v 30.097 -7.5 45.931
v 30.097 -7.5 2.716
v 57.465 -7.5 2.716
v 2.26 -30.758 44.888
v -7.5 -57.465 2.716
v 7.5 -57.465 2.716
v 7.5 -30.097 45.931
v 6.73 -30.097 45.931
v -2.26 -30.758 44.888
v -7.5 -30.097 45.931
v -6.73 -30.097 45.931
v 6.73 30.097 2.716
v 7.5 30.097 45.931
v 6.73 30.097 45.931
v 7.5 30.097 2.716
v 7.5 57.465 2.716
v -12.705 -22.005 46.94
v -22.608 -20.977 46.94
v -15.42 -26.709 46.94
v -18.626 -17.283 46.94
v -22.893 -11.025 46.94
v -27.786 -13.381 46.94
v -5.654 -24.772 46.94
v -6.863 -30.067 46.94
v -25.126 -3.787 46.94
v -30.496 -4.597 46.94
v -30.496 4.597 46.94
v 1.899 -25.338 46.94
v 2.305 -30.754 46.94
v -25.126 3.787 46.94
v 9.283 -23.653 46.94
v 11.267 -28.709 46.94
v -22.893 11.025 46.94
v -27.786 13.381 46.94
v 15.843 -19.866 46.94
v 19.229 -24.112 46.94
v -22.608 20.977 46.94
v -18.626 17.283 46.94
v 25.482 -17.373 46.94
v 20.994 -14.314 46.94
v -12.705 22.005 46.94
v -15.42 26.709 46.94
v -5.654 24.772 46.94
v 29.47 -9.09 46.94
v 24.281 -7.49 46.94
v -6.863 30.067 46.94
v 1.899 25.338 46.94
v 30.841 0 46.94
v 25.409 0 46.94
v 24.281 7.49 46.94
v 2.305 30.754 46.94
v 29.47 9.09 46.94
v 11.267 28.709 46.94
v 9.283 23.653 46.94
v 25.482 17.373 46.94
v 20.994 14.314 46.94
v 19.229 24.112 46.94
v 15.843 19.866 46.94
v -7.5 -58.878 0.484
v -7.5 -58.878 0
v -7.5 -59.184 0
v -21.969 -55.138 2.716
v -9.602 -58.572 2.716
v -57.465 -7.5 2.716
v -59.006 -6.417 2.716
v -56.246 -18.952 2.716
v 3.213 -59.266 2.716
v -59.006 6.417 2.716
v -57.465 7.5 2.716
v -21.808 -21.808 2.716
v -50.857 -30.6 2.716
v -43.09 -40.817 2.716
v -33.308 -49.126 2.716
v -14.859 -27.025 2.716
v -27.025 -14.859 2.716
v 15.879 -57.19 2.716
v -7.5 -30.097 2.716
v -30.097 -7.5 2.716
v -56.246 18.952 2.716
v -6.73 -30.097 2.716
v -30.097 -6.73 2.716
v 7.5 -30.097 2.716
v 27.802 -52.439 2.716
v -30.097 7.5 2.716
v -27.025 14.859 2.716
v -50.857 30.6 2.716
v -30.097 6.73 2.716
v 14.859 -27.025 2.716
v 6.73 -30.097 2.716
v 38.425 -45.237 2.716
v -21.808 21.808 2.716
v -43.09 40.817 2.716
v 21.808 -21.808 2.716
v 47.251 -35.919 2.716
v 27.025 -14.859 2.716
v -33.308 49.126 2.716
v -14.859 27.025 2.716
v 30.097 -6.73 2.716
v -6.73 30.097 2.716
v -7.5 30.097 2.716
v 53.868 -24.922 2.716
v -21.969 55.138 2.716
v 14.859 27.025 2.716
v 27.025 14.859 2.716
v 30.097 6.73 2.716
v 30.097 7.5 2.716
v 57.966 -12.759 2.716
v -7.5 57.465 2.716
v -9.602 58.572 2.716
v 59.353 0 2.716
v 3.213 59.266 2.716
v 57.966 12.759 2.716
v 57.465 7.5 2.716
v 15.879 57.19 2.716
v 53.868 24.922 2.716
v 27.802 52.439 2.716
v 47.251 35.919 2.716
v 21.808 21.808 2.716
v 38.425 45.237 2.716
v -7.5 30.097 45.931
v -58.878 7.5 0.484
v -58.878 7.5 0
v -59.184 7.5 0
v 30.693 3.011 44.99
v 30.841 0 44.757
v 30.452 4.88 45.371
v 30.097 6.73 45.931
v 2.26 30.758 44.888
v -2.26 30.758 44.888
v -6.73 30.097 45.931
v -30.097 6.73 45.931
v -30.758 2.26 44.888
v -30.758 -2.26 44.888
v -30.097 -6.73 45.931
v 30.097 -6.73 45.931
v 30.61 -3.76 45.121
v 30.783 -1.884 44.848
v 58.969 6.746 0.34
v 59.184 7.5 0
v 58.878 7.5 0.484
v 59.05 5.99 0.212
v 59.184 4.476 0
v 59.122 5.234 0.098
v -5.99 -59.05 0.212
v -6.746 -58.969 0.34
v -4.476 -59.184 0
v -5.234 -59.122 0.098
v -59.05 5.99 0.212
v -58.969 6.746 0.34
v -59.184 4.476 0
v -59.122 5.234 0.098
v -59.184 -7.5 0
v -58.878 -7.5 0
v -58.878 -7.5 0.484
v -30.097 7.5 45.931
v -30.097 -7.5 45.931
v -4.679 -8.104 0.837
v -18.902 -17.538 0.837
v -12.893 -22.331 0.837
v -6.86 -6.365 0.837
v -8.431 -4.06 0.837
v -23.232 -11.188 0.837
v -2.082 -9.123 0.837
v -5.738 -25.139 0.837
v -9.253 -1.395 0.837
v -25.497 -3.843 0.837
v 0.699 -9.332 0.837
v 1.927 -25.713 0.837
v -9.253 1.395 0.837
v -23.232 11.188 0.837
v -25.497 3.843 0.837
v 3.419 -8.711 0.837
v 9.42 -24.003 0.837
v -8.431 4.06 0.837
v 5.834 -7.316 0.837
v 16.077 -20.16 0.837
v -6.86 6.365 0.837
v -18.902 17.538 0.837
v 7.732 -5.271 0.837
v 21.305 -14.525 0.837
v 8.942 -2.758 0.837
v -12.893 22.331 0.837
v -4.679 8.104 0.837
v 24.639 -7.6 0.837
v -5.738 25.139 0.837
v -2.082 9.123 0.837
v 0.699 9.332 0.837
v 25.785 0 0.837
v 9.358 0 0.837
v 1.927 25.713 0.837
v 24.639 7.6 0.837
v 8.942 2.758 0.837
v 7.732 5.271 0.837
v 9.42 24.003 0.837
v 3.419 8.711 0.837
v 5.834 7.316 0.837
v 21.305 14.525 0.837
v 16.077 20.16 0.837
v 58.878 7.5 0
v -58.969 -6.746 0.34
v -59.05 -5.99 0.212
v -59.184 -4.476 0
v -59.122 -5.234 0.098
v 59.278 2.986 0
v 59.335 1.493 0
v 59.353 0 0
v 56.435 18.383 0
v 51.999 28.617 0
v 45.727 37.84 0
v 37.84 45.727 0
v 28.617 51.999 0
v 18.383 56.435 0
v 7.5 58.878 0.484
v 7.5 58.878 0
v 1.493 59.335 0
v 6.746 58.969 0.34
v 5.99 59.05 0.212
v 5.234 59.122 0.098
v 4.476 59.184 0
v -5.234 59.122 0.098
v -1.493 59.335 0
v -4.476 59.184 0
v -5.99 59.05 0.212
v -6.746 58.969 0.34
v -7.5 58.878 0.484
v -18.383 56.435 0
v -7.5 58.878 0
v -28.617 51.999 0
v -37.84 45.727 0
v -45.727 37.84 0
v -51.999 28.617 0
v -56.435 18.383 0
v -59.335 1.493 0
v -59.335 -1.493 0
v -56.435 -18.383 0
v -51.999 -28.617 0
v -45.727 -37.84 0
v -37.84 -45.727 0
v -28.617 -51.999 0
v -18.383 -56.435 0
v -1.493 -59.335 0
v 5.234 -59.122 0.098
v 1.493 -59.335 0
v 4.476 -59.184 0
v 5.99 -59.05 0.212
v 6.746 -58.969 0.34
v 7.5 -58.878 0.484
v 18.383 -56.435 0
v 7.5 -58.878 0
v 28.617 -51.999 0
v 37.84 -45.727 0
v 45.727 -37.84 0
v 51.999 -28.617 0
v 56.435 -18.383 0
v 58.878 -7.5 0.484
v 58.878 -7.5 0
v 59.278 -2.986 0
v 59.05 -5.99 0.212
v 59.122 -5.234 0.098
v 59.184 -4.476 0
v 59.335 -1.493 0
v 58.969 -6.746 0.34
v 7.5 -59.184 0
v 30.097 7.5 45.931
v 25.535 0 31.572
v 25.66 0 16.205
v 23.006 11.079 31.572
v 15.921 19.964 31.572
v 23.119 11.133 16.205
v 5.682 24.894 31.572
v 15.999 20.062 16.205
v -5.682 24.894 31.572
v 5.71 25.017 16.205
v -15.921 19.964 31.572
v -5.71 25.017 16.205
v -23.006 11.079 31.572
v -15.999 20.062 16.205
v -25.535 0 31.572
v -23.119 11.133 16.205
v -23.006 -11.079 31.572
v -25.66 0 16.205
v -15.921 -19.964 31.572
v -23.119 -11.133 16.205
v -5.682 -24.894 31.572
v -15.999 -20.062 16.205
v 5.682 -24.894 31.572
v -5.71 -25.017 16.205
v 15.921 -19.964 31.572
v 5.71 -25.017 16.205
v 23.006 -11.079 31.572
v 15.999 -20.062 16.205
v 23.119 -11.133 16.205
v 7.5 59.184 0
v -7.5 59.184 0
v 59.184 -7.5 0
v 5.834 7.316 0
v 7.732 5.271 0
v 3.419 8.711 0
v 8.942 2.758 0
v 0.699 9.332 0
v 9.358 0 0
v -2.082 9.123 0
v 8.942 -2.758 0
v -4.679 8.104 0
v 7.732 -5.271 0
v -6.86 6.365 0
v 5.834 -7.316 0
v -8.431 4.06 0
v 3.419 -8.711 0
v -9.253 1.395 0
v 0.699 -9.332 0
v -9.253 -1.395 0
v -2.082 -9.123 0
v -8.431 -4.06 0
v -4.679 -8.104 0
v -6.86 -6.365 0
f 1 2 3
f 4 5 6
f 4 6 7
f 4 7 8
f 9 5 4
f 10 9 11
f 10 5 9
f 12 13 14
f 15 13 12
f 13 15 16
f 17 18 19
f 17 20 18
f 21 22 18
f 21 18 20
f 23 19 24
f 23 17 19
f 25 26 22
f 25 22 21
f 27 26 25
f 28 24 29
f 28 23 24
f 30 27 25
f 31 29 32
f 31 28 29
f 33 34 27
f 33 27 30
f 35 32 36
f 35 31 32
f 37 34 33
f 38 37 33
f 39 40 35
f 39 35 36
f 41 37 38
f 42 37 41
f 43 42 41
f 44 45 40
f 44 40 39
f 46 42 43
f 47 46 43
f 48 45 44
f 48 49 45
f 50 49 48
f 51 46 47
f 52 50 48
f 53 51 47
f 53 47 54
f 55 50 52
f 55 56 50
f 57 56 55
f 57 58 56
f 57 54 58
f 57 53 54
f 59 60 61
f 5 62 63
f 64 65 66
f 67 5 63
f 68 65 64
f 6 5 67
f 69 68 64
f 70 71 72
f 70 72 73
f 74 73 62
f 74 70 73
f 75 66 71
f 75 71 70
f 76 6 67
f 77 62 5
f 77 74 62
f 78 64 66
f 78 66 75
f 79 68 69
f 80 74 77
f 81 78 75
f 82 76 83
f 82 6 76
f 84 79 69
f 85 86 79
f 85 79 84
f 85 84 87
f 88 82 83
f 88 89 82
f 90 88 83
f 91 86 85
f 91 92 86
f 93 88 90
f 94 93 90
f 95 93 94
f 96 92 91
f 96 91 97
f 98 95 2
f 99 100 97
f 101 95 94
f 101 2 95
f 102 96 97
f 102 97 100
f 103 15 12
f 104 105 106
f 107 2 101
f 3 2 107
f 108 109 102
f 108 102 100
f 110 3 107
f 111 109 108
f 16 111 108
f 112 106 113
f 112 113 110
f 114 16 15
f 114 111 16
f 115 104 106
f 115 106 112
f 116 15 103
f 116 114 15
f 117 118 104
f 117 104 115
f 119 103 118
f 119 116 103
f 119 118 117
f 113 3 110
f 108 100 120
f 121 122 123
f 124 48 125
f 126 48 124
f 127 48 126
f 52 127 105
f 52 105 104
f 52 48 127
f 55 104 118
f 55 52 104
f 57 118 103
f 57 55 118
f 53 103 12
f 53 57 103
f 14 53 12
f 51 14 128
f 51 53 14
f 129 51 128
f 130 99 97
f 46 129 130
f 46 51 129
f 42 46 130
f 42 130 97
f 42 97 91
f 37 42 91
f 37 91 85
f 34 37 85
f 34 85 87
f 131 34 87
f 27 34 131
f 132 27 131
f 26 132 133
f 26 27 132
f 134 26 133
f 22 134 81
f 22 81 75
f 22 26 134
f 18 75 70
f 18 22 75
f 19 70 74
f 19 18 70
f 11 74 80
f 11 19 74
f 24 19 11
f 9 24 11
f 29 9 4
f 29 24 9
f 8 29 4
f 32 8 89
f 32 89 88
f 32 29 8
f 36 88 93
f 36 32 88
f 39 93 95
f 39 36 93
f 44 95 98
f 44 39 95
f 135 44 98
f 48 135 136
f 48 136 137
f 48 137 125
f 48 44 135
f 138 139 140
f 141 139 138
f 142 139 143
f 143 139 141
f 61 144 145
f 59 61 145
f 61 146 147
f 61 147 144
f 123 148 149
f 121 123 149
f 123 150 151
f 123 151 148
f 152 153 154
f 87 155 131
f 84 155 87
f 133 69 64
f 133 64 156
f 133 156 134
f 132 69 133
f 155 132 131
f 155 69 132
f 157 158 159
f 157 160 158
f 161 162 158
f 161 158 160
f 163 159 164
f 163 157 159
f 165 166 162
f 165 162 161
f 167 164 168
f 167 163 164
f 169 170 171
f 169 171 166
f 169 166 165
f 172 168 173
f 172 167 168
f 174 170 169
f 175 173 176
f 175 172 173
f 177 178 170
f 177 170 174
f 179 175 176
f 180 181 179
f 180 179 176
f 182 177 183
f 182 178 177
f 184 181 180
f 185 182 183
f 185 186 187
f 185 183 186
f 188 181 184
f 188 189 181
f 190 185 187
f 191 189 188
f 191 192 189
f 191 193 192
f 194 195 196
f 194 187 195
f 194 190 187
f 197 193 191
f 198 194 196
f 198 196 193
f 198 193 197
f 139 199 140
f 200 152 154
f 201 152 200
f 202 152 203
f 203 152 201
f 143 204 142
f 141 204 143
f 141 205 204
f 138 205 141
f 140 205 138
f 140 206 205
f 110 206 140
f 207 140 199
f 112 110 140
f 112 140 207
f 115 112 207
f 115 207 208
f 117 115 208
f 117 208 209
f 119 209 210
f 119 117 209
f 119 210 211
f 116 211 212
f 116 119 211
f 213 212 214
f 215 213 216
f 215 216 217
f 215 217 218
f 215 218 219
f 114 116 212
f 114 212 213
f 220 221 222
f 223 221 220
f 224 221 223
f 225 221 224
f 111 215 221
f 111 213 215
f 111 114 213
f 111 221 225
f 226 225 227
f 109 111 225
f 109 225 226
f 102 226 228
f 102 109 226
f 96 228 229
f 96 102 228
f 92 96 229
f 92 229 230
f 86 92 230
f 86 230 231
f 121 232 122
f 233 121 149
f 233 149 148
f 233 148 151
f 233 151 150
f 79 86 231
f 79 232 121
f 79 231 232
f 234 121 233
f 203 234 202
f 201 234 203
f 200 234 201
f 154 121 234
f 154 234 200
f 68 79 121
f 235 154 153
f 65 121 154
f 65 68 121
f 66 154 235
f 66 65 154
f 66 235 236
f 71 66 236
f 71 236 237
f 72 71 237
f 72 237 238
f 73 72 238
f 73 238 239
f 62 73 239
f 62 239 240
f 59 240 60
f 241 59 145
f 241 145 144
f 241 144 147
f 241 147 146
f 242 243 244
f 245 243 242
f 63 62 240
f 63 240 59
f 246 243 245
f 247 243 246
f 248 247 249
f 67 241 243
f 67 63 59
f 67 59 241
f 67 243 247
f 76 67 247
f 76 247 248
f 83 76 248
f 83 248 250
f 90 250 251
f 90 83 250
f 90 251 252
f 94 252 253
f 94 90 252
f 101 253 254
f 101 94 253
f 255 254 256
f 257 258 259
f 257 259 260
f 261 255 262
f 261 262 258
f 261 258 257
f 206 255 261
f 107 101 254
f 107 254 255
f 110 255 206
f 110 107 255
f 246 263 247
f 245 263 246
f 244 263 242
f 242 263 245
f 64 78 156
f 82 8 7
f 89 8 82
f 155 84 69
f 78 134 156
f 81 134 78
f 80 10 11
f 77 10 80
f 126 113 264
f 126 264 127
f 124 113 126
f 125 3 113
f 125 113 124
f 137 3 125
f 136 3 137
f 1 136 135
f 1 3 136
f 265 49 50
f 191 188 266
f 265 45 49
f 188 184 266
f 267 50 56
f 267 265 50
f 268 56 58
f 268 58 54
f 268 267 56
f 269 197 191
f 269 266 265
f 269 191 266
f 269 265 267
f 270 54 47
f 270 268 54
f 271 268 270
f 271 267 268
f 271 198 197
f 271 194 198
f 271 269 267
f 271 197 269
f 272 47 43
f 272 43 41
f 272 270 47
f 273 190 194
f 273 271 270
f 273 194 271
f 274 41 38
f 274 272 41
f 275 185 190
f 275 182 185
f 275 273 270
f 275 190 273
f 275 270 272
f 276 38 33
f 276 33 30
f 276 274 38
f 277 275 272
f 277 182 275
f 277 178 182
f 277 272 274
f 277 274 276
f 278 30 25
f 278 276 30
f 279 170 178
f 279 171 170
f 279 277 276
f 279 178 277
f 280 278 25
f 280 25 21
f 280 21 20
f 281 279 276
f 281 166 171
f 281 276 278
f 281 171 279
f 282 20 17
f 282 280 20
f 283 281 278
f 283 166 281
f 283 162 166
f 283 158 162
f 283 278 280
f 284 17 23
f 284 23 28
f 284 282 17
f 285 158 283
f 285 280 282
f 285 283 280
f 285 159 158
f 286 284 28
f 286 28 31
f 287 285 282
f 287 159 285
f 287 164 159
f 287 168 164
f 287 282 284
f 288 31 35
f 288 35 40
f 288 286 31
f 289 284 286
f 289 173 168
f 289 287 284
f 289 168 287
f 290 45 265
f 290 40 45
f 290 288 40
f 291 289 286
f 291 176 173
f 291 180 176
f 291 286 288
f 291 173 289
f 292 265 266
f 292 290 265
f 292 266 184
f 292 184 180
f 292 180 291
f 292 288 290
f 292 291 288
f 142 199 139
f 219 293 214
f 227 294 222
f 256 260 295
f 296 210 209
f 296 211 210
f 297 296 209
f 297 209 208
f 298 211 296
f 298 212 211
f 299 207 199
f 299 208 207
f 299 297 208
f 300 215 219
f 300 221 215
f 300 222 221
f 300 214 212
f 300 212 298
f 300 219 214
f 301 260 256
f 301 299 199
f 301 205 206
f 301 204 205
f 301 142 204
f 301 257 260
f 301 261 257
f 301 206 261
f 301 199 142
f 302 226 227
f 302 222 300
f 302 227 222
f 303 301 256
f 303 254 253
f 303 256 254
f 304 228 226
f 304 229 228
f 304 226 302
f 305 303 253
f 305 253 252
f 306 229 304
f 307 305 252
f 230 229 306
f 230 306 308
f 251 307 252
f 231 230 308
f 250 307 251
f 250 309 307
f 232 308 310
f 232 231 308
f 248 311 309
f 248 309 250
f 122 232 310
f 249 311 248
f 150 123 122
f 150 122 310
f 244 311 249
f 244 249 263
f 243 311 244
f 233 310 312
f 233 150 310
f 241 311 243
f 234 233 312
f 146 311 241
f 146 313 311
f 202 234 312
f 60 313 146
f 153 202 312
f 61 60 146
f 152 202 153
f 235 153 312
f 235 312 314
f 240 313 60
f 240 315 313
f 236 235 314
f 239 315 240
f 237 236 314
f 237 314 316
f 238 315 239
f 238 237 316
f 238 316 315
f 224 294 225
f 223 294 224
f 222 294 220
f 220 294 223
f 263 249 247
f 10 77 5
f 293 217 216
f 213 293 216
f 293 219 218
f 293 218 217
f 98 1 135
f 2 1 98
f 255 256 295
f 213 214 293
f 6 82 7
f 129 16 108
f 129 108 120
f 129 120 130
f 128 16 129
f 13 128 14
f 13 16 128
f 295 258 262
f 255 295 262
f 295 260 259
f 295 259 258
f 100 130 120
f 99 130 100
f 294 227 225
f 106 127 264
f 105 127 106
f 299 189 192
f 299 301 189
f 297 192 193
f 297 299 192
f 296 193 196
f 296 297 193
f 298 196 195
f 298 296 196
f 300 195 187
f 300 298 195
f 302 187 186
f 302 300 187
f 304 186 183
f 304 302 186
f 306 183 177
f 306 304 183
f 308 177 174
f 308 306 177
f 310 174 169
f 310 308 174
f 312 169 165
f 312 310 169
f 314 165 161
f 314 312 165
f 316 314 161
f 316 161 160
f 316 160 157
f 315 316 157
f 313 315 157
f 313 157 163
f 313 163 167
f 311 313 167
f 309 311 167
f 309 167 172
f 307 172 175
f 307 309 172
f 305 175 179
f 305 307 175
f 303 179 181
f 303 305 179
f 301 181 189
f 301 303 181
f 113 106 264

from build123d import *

# Parameters (mm, degrees)
F4_DEPTH        = 7.5
F4_COPIES_COUNT = 4


# Not quite as in the source:
# - a pattern or mirror of a feature is missing from the dataset's text; its kind, count and spacing are read off the source's solid


with BuildPart() as f2:
    # F0 (on Front) → F2 (revolve)
    with BuildSketch(Plane.XZ):
        Polygon((9.3577429652, 0), (59.3534484506, 0), (59.3534484506, 2.7155173011), (30.840517953, 2.7155173011), (30.840517953, 46.9396561384), (25.4094842821, 46.9396561384), (25.7850456983, 0.8370543364), (9.3577429652, 0.8370543364), align=None)
    revolve(axis=Axis((0, 0, 37.2192747891), (0, 0, 1)))

    # F3 (on Front) → F4 (join, symmetric)
    with BuildSketch(Plane.XZ):
        Polygon((59.184409678, 0), (30.097162351, 45.9310486913), (30.097162351, 0), align=None)
    f4 = extrude(amount=F4_DEPTH, both=True)

    # F4_copies: F4 ×4 about axis
    f4_copies_axis = Axis((0, 0, 0), (0, 0, 1))
    for i in range(1, F4_COPIES_COUNT):
        add(f4.rotate(f4_copies_axis, i * 360 / F4_COPIES_COUNT))


solid = f2.part
